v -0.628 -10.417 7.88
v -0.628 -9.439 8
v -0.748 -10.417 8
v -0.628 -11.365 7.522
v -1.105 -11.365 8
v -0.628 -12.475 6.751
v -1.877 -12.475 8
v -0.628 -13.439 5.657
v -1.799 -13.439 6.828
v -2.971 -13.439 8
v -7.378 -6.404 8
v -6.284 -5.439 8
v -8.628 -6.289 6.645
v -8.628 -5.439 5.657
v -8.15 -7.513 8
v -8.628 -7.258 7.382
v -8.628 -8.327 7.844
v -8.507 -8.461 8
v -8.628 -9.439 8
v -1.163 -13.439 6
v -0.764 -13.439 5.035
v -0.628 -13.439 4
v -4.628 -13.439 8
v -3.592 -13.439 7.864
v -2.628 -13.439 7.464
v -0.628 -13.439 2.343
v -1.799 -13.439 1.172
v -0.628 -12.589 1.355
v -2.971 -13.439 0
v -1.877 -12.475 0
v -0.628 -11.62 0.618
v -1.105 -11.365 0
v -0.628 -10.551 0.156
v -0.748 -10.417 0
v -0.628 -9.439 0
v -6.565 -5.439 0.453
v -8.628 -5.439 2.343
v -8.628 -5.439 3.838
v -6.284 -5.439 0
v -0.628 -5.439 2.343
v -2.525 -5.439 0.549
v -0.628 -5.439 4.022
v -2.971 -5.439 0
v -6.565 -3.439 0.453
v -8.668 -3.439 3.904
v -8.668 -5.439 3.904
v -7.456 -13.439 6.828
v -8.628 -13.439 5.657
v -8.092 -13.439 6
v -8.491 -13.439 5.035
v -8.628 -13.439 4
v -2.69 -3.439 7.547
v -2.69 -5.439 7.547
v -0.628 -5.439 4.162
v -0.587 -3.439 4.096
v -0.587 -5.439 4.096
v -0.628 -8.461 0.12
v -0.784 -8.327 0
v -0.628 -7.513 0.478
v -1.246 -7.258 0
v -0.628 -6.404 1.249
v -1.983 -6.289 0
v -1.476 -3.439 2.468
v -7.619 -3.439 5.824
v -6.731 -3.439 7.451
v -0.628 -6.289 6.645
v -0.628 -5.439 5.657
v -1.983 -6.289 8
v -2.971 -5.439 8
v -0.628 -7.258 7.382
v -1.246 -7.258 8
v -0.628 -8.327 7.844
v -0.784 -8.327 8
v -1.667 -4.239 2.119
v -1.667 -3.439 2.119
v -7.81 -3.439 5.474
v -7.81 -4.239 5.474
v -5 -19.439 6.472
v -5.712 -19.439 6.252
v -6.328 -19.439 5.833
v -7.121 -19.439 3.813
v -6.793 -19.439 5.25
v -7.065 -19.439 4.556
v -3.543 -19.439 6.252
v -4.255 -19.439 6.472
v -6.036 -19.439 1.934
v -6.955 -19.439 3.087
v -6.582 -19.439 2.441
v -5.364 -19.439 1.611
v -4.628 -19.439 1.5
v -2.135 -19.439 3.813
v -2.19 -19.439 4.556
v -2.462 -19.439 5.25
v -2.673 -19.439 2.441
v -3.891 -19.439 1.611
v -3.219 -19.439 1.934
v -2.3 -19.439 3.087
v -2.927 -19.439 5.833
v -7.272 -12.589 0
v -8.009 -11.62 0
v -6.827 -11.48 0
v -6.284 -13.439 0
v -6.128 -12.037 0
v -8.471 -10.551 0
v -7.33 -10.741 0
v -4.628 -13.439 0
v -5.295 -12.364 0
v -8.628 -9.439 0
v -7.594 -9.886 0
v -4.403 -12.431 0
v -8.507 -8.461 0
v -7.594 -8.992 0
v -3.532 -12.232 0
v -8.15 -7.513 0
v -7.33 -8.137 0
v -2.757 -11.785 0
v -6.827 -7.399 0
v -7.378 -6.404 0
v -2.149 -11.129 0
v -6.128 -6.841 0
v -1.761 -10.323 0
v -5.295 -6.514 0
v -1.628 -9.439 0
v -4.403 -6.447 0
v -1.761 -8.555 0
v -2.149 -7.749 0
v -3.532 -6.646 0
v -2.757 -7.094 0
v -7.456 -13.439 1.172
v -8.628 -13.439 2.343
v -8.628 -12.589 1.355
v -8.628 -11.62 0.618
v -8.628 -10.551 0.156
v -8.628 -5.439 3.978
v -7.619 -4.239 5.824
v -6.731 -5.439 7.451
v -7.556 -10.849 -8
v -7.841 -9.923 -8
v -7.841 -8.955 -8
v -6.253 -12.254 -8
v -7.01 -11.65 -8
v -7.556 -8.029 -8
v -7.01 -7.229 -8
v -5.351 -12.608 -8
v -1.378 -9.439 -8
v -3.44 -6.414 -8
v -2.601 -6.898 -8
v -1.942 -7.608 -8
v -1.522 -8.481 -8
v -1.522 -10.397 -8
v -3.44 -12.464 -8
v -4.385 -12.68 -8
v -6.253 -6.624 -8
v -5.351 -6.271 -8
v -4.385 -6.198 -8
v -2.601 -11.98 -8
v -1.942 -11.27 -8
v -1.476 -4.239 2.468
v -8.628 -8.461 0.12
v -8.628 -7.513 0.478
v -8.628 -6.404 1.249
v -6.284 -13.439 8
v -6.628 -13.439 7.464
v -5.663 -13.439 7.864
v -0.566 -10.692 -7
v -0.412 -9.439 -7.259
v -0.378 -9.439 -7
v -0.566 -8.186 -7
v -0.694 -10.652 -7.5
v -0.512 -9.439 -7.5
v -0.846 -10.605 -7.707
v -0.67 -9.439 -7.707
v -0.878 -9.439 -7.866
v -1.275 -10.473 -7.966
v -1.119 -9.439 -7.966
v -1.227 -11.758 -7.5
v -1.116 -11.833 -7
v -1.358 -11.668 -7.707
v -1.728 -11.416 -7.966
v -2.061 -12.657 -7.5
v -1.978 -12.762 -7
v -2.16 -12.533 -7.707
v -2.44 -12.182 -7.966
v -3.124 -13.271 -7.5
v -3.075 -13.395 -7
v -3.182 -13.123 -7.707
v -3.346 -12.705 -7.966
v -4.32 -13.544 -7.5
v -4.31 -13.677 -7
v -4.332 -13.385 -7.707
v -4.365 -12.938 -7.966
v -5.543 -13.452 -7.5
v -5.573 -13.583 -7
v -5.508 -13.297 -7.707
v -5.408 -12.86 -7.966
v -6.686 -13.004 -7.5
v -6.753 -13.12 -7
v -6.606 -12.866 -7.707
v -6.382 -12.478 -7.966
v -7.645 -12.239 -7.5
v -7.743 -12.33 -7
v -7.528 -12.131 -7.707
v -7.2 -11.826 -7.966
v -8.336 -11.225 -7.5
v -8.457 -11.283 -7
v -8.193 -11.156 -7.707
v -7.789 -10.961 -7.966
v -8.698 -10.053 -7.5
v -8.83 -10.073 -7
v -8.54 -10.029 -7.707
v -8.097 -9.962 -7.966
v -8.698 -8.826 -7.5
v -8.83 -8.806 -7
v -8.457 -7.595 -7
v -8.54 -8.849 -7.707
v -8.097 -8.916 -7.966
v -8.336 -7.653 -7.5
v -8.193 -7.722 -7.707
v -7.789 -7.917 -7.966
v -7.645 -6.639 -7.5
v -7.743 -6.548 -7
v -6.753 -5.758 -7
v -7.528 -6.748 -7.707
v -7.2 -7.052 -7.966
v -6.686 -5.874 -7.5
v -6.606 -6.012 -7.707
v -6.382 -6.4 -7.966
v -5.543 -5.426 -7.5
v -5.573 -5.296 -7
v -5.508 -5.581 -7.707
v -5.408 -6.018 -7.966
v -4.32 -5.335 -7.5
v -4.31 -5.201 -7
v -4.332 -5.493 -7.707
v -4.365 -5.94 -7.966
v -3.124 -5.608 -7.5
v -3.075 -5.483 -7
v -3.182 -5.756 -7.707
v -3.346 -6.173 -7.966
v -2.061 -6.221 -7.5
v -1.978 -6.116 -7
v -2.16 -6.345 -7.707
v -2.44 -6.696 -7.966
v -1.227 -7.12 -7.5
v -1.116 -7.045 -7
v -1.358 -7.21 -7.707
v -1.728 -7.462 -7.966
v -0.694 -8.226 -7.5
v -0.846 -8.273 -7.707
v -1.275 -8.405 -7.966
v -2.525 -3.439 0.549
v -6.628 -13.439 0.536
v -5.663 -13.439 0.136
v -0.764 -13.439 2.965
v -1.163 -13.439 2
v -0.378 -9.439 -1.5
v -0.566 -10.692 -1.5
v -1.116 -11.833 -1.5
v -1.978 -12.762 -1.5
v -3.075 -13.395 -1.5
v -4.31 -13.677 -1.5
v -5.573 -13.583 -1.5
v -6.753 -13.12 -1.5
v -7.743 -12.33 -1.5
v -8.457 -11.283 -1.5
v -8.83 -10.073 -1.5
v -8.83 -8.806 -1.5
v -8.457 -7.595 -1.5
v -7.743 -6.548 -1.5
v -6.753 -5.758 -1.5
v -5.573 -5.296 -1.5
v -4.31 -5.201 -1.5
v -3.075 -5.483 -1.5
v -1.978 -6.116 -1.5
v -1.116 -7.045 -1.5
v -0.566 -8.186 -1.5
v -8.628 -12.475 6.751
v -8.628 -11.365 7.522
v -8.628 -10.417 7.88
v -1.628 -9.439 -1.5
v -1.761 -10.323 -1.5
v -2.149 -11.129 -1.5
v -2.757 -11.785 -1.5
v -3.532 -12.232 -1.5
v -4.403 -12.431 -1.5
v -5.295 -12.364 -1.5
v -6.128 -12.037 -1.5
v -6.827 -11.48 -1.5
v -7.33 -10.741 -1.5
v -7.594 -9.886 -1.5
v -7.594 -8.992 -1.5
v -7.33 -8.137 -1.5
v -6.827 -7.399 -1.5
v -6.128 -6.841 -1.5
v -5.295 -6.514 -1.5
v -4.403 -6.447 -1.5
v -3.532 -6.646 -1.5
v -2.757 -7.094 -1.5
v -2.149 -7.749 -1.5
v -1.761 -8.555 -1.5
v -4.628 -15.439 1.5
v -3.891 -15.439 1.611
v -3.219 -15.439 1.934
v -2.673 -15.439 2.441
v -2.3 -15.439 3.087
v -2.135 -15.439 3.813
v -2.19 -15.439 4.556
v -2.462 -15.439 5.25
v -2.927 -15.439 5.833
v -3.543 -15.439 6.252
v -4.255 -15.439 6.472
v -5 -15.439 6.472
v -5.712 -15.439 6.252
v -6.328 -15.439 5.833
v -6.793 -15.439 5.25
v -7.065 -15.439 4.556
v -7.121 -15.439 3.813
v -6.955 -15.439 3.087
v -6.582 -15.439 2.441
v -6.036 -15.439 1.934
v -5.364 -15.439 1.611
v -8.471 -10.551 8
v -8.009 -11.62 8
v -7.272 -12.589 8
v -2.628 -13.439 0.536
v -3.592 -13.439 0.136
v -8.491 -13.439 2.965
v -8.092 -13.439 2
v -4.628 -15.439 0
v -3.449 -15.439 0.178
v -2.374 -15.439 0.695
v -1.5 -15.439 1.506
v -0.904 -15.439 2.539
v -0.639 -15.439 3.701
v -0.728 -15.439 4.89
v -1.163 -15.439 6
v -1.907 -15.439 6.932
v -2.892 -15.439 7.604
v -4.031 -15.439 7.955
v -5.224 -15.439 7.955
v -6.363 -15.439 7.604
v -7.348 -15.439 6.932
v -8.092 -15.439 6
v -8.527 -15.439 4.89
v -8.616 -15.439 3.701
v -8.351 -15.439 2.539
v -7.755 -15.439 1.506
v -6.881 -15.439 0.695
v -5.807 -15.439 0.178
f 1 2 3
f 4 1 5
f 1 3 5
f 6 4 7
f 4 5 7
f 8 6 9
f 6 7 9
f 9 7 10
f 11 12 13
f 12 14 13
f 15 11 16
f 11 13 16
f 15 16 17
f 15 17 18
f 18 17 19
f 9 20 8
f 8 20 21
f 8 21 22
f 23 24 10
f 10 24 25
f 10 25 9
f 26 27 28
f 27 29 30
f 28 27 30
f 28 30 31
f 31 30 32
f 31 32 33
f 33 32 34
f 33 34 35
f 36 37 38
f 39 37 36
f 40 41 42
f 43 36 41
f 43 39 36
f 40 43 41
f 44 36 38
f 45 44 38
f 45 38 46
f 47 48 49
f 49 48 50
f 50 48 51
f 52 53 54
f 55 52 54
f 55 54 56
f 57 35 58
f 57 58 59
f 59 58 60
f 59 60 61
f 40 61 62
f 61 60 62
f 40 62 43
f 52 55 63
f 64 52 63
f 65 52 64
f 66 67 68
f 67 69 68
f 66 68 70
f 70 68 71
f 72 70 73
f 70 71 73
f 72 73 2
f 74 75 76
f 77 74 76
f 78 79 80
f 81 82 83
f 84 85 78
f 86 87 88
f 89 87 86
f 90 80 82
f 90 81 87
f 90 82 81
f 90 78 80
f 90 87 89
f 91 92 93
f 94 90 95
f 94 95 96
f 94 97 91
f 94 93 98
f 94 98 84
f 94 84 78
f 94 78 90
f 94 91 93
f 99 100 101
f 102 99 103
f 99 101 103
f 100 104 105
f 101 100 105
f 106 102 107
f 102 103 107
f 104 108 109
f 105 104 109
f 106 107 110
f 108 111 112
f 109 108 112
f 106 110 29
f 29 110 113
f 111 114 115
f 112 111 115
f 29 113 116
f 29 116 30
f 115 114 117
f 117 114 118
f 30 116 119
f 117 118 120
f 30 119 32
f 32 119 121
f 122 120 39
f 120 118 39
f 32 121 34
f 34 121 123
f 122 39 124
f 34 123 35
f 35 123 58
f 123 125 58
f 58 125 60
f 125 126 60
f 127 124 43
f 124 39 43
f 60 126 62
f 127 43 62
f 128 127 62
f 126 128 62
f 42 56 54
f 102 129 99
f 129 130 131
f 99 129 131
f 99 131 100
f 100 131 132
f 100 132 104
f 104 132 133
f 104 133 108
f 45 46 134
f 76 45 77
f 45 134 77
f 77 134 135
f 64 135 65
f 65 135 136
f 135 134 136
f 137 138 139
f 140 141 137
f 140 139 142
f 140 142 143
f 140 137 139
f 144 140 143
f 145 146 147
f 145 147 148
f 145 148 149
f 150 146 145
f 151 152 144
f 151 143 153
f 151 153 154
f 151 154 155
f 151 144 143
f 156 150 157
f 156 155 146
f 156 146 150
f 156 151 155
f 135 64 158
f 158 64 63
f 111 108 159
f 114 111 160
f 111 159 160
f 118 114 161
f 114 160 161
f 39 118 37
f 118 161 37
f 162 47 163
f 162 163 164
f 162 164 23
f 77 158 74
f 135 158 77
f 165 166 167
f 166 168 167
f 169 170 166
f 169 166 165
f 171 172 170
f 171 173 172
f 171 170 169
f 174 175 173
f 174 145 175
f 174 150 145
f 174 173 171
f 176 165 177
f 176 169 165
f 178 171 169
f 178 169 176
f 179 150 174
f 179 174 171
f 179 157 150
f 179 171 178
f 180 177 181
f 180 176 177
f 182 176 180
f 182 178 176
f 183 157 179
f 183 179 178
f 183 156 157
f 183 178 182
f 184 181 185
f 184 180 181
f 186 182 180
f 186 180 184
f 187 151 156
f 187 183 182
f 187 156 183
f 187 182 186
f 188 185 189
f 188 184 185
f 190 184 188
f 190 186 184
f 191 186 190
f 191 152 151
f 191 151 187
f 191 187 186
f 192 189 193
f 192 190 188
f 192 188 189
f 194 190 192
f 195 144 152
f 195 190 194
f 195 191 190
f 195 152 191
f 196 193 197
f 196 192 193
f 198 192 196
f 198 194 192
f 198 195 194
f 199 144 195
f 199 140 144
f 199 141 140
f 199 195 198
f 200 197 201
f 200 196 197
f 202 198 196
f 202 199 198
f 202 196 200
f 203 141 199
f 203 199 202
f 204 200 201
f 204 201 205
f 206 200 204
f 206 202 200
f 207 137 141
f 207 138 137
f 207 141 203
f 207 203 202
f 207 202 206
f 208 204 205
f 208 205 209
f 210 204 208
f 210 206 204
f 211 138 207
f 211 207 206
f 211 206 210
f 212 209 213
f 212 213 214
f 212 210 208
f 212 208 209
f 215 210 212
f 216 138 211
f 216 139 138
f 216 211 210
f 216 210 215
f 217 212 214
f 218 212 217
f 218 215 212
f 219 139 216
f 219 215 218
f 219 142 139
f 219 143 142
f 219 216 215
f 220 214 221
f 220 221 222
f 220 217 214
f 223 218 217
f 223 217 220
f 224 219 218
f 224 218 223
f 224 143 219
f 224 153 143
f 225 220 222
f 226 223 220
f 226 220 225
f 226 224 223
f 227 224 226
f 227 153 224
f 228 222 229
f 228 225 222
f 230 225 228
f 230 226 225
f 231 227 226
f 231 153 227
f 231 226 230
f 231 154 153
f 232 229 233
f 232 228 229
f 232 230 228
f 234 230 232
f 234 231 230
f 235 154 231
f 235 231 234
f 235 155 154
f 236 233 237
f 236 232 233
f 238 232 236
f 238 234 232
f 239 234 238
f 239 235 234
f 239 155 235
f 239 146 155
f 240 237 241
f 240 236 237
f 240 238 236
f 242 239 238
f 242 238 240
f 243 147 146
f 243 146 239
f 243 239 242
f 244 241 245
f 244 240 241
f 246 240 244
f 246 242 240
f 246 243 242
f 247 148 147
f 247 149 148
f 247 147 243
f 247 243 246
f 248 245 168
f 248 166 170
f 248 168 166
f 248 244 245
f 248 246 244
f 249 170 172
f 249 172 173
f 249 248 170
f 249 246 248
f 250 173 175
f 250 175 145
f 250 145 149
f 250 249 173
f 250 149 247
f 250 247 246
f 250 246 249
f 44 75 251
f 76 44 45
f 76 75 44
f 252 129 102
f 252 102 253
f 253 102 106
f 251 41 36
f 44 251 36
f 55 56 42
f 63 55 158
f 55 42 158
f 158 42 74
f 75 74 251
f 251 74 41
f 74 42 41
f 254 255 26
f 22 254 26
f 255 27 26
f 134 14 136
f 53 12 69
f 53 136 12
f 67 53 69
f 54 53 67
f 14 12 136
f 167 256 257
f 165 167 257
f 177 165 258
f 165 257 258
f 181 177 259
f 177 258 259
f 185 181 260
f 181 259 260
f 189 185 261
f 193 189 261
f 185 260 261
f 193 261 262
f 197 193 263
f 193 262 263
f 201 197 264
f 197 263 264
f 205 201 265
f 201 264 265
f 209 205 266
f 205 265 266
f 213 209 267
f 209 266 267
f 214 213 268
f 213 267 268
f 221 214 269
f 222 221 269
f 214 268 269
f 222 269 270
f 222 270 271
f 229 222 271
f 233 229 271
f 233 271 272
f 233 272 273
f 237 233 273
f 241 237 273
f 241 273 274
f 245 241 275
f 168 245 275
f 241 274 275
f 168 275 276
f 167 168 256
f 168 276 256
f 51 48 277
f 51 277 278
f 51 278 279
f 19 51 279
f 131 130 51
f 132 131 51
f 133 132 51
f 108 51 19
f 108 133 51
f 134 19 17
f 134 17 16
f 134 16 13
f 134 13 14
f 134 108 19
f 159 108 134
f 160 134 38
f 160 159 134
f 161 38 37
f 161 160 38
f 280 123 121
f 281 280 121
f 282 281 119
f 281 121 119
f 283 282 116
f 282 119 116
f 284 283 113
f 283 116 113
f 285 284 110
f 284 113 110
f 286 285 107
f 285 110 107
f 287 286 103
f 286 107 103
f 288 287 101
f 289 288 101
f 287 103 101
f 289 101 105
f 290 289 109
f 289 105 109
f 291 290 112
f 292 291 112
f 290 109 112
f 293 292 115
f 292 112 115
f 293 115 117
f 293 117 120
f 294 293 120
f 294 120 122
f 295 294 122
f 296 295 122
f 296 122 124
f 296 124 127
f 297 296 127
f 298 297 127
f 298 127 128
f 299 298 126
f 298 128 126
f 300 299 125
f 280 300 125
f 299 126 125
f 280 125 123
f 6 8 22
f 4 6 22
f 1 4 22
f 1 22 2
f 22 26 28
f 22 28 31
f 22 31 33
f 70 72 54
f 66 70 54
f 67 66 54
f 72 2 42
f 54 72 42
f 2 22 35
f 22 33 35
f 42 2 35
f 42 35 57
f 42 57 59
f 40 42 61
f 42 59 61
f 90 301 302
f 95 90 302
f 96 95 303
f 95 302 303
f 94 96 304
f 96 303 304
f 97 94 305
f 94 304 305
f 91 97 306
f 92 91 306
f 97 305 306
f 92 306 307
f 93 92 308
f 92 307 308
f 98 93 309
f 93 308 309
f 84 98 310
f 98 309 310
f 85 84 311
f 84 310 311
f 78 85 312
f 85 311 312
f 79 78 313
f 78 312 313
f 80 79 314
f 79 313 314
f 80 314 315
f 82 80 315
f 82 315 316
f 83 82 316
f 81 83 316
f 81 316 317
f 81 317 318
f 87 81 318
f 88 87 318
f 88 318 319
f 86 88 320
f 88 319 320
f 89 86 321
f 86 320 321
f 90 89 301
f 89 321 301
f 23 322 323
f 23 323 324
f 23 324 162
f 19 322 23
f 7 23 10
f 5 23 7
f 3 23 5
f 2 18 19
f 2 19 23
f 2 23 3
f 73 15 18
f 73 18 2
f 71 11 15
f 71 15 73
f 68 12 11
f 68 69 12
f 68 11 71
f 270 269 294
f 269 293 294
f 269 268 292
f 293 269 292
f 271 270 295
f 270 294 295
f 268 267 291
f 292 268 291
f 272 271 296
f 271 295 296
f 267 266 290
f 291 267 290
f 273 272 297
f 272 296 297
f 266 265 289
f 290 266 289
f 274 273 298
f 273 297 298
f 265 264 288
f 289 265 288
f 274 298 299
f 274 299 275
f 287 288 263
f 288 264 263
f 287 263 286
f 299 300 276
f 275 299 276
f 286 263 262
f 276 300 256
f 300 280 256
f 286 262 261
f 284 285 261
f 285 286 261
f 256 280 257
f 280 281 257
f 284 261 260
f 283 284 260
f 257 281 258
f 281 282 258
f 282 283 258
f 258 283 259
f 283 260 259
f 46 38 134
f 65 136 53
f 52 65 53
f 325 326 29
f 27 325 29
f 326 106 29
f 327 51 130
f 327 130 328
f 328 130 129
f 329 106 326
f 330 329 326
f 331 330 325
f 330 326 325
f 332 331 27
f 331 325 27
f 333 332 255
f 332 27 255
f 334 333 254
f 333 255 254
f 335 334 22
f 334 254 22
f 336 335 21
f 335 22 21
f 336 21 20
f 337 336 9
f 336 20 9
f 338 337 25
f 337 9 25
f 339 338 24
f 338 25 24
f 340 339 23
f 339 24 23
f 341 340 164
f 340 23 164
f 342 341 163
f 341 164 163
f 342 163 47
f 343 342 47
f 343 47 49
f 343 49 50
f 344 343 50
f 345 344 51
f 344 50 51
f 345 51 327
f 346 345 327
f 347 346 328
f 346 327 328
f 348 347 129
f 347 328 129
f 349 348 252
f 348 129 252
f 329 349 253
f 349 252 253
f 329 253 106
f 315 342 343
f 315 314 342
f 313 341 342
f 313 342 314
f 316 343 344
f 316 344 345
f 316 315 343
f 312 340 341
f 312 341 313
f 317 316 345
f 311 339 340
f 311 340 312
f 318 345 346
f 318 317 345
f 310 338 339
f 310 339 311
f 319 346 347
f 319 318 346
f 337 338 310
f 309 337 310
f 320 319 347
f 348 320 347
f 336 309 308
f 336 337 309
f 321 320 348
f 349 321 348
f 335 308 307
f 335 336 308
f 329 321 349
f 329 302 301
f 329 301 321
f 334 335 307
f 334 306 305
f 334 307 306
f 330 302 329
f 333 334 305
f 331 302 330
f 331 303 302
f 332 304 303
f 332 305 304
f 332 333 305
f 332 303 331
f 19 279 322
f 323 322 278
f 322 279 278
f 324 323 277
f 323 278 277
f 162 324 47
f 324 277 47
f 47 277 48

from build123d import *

# Parameters (mm, degrees)
ESQUISSE1_W             = 8
ESQUISSE1_H             = 8
EXTRUSION1_DEPTH        = 8
ESQUISSE2_R             = 7.864437578
ESQUISSE2_R_2           = 5.656854249
ENL_V_MAT_EXTRU_1_DEPTH = 9
ESQUISSE3_R             = 8.352248068
ESQUISSE3_R_2           = 5.656854249
ENL_V_MAT_EXTRU_2_DEPTH = 9
EXTRUSION2_DEPTH        = 2
ESQUISSE5_R             = 4
EXTRUSION3_DEPTH        = 2
ESQUISSE6_R             = 2.5
EXTRUSION4_DEPTH        = 4
ESQUISSE7_R             = 3
EXTRUSION5_DEPTH        = 1.5
ESQUISSE8_R             = 4.25
EXTRUSION6_DEPTH        = 6.5
CONG_1_R                = 1
ENL_V_MAT_EXTRU_3_DEPTH = 0.8


with BuildPart() as part:
    # Esquisse1 → Extrusion1 (new body)
    with BuildSketch(Plane.XY):
        with Locations((-4.627553444, -9.439073634)):
            Rectangle(ESQUISSE1_W, ESQUISSE1_H)
    extrude(amount=EXTRUSION1_DEPTH)

    # Esquisse2 → Enlèv. mat.-Extru.1 (cut, symmetric)
    with BuildSketch(Plane(origin=(-4.313776722, 0, 4.313776722), x_dir=(-0.7071067811865488, 0, -0.7071067811865462), z_dir=(0.7071067811865462, 0, -0.7071067811865488))):
        with Locations((0.443747296, -9.439073634)):
            Circle(ESQUISSE2_R)
        with Locations((0.443747296, -9.439073634)):
            Circle(ESQUISSE2_R_2, mode=Mode.SUBTRACT)
    extrude(amount=ENL_V_MAT_EXTRU_1_DEPTH, both=True, mode=Mode.SUBTRACT)

    # Esquisse3 → Enlèv. mat.-Extru.2 (cut, symmetric)
    with BuildSketch(Plane(origin=(-0.313776722, 0, -0.313776722), x_dir=(0.7071067811865483, 0, -0.7071067811865468), z_dir=(0.7071067811865468, 0, 0.7071067811865483))):
        with Locations((-6.100601545, -9.439073634)):
            Circle(ESQUISSE3_R)
        with Locations((-6.100601545, -9.439073634)):
            Circle(ESQUISSE3_R_2, mode=Mode.SUBTRACT)
    extrude(amount=ENL_V_MAT_EXTRU_2_DEPTH, both=True, mode=Mode.SUBTRACT)

    # Esquisse4 → Extrusion2 (add)
    with BuildSketch(Plane(origin=(0, -5.439073634, 0), x_dir=(-1, 0, 0), z_dir=(0, 1, 0))):
        Polygon((2.690239828, 7.546850615), (0.5872339, 4.095662501), (2.524547516, 0.548811886), (6.564867061, 0.453149385), (8.667872988, 3.904337499), (6.730559372, 7.451188114), align=None)
    extrude(amount=EXTRUSION2_DEPTH)

    # Esquisse5 → Extrusion3 (add)
    with BuildSketch(Plane.XZ.offset(13.439073634)):
        with Locations(Location((-4.627553444, 4, 0), (0, 0, 270))):
            Circle(ESQUISSE5_R)
    extrude(amount=EXTRUSION3_DEPTH)

    # Esquisse6 → Extrusion4 (add)
    with BuildSketch(Plane.XZ.offset(15.439073634)):
        with Locations(Location((-4.627553444, 4, 0), (0, 0, 270))):
            Circle(ESQUISSE6_R)
    extrude(amount=EXTRUSION4_DEPTH)

    # Esquisse7 → Extrusion5 (add)
    with BuildSketch(Plane(origin=(0, 0, 0), x_dir=(-1, 0, 0), z_dir=(0, 0, -1))):
        with Locations(Location((4.627553444, -9.439073634, 0), (0, 0, 180))):
            Circle(ESQUISSE7_R)
    extrude(amount=EXTRUSION5_DEPTH)

    # Esquisse8 → Extrusion6 (add)
    with BuildSketch(Plane(origin=(0, 0, -1.5), x_dir=(-1, 0, 0), z_dir=(0, 0, -1))):
        with Locations(Location((4.627553444, -9.439073634, 0), (0, 0, 180))):
            Circle(ESQUISSE8_R)
    extrude(amount=EXTRUSION6_DEPTH)

    # Congé1
    cong_1_edges = [part.edges().sort_by_distance(p)[0] for p in [
        (-8.877553444, -9.439073634, -8),
    ]]
    fillet(cong_1_edges, radius=CONG_1_R)

    # Esquisse9 → Enlèv. mat.-Extru.3 (cut)
    with BuildSketch(Plane(origin=(0, -3.439073634, 0), x_dir=(-1, 0, 0), z_dir=(0, 1, 0))):
        Polygon((1.321943124, 1.93003998), (8.151603046, 5.660446078), (7.960645286, 6.010053204), (1.130985365, 2.279647106), align=None)
    extrude(amount=-ENL_V_MAT_EXTRU_3_DEPTH, mode=Mode.SUBTRACT)


solid = part.part
